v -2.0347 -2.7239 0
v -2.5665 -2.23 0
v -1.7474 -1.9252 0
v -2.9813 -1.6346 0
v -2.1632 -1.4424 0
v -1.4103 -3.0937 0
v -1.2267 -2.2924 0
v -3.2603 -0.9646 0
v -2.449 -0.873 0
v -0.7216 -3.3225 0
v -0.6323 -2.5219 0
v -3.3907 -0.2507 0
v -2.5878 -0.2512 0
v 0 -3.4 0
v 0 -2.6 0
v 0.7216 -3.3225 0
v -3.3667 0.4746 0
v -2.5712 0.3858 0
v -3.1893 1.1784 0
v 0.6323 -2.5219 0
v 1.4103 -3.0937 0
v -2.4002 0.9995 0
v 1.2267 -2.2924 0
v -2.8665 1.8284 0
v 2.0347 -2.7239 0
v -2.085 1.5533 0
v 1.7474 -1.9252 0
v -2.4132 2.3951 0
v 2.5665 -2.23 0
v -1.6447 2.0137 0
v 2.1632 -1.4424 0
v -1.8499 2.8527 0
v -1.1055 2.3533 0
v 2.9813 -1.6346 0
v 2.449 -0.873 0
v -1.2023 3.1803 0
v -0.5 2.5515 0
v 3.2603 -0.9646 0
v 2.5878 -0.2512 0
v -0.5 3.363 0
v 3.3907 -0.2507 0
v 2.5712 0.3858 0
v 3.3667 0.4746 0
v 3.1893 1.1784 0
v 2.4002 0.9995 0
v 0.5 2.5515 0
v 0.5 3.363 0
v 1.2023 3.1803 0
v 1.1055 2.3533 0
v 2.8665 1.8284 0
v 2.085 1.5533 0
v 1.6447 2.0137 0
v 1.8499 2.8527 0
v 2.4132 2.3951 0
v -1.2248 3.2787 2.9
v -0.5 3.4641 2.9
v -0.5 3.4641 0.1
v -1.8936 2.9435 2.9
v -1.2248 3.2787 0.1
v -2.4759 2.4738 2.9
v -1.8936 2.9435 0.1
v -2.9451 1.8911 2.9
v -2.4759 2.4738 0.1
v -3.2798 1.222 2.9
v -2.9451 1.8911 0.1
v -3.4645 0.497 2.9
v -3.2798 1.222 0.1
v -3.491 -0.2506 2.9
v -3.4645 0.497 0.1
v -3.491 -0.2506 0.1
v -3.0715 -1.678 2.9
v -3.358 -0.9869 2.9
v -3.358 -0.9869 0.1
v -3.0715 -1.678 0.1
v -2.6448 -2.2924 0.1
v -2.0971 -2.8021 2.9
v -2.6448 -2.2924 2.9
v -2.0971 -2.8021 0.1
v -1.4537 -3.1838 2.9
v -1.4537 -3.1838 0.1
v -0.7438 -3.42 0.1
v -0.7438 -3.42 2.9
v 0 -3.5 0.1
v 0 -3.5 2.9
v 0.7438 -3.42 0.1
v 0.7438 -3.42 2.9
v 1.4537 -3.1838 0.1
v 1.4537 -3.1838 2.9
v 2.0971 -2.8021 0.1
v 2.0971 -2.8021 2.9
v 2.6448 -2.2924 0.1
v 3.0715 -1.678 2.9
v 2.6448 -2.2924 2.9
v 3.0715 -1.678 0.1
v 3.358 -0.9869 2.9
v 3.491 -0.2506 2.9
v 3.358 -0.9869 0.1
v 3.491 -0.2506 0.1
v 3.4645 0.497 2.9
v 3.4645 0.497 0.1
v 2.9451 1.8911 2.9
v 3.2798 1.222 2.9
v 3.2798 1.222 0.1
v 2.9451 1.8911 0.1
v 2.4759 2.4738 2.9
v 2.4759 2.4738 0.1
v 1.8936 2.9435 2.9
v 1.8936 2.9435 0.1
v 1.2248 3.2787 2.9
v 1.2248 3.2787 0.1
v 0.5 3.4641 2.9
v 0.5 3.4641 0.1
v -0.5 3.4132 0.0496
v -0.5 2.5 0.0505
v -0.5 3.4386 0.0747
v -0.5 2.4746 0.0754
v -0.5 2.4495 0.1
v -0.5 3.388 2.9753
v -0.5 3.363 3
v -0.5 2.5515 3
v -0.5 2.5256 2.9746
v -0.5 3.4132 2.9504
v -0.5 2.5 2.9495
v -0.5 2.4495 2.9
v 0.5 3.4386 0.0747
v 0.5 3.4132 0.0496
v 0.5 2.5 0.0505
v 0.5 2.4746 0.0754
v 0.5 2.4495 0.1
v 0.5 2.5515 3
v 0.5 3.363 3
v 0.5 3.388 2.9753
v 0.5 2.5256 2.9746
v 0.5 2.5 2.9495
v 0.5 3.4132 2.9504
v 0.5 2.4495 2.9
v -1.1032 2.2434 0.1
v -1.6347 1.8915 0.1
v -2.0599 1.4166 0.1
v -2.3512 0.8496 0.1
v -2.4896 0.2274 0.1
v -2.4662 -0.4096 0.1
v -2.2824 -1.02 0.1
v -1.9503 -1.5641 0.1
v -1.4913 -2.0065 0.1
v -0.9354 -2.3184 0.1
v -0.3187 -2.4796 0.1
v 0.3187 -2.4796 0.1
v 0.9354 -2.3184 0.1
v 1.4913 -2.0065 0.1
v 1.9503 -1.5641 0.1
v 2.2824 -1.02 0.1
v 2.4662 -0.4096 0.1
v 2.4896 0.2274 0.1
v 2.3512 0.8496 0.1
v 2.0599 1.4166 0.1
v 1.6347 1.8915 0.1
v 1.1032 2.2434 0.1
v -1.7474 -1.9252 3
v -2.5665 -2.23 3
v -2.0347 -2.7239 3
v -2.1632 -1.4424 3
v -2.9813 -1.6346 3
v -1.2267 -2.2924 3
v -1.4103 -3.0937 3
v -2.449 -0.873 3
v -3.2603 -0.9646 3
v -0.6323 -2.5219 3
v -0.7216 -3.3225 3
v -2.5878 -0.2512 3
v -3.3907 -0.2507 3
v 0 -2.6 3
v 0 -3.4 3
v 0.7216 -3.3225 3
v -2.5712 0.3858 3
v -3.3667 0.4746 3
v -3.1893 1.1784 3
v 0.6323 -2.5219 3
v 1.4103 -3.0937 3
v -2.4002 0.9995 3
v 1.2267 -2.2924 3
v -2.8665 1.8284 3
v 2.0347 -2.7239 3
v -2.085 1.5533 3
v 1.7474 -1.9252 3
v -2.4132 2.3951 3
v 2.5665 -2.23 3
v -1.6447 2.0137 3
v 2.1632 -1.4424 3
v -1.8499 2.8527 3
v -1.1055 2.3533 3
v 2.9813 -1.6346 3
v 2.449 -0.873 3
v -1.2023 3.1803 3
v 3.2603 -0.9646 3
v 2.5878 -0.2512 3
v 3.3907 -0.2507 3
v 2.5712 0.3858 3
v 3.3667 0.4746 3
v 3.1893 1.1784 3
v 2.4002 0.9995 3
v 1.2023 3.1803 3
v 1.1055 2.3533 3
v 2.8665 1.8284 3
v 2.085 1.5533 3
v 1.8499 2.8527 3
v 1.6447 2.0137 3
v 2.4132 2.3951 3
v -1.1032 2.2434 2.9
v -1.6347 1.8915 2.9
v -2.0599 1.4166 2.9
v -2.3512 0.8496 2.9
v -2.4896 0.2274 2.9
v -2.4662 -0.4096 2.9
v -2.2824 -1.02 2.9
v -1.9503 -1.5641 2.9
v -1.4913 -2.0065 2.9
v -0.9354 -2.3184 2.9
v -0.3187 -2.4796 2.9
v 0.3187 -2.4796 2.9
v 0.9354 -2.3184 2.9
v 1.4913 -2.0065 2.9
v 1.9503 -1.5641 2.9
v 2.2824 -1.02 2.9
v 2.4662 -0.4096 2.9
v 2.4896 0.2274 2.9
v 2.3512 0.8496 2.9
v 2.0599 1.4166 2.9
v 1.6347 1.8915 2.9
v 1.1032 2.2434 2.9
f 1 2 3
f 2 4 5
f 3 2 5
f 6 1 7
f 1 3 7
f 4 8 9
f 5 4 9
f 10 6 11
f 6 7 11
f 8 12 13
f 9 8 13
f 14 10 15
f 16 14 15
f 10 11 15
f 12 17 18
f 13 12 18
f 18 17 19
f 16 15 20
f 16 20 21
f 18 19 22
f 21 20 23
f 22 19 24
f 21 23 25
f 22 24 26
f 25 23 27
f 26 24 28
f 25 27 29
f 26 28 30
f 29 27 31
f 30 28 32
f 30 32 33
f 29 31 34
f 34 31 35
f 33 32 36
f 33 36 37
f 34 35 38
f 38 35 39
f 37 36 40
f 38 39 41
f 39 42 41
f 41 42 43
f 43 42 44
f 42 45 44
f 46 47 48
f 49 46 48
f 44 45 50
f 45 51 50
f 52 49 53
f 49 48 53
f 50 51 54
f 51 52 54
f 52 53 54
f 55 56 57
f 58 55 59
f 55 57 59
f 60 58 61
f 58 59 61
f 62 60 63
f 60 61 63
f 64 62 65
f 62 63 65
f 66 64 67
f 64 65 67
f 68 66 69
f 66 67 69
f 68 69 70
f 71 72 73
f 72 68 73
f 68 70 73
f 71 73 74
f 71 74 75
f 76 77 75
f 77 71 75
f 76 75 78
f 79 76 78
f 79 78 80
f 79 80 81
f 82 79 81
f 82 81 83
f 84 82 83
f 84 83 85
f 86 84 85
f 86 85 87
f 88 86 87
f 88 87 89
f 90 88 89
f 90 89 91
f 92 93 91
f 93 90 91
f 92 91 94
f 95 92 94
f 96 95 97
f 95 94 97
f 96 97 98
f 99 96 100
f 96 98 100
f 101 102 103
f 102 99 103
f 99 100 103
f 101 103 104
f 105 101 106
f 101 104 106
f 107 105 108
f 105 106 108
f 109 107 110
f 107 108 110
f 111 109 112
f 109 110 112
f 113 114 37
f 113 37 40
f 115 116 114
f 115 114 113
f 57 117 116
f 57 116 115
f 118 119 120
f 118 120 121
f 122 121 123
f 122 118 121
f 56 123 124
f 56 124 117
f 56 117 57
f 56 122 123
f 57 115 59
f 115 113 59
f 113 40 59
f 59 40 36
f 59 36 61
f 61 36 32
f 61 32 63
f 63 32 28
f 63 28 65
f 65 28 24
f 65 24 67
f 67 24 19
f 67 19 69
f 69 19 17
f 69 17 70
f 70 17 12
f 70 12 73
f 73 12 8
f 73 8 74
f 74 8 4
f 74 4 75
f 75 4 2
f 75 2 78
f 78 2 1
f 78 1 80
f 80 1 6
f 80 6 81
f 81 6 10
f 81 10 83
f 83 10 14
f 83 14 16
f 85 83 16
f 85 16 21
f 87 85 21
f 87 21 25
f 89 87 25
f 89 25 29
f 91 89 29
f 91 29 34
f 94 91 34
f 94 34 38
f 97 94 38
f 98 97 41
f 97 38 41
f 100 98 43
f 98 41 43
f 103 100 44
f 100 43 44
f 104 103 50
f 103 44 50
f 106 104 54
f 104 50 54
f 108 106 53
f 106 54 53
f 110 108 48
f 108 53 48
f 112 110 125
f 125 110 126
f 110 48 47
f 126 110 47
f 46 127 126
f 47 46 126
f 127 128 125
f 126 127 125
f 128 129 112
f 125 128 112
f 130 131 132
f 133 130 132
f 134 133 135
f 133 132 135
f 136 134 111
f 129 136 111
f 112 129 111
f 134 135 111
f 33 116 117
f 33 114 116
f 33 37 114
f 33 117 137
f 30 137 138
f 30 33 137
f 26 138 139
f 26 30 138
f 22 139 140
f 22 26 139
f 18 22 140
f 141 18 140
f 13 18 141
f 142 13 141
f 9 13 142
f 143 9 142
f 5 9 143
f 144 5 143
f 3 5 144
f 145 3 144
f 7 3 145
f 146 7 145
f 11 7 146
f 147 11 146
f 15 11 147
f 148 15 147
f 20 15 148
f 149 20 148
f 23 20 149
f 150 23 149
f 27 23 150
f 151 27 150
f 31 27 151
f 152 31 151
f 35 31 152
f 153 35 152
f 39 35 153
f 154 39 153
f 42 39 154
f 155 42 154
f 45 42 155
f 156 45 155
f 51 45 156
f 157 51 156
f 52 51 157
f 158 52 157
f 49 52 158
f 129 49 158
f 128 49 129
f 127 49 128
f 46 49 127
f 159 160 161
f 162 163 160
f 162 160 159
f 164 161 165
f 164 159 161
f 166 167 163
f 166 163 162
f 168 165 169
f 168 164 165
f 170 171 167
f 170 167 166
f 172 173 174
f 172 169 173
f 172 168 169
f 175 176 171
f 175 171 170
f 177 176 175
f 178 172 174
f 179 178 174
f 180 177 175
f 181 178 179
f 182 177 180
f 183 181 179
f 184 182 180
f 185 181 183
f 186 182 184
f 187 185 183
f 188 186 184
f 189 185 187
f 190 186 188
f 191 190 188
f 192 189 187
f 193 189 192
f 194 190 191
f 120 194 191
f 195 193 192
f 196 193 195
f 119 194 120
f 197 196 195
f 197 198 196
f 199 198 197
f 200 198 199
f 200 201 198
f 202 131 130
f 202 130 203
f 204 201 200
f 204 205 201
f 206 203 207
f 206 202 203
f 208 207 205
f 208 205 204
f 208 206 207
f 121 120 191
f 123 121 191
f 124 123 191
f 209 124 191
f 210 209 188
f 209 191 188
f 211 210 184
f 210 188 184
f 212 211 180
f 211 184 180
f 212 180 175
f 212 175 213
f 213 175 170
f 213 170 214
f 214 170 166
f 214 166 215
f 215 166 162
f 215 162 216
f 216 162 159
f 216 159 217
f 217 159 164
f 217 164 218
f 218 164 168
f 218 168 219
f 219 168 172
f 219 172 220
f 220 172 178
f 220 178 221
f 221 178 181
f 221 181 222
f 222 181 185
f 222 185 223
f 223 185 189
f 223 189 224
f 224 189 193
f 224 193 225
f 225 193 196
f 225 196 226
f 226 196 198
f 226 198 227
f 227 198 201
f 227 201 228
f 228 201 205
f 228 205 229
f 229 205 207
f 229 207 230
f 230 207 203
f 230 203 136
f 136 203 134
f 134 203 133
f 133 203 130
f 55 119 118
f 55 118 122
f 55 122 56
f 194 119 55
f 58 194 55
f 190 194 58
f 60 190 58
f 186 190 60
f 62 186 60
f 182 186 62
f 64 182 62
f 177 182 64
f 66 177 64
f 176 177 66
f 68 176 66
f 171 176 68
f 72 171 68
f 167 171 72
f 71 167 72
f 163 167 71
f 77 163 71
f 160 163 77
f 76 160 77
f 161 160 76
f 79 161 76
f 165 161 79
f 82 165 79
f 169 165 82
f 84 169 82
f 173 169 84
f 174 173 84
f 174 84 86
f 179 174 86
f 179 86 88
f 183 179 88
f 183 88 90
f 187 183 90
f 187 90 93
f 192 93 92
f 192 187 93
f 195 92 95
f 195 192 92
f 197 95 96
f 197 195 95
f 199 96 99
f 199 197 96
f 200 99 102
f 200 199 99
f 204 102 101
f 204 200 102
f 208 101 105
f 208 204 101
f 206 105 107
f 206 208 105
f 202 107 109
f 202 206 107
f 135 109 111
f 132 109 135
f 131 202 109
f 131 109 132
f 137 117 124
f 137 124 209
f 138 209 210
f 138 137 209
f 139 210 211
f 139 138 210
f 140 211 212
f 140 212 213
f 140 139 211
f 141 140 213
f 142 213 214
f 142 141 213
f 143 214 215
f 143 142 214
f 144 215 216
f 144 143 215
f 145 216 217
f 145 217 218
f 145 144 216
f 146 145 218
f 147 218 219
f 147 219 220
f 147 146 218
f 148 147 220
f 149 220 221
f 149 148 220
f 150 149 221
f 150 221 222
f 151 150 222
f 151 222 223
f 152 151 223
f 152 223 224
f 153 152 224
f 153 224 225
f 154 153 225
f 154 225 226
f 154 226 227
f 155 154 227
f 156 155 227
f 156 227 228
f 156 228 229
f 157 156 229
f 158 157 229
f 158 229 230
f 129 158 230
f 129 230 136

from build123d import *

# Parameters (mm, degrees)
SKETCH_1_R               = 3.5
SKETCH_1_R_2             = 2.5
EXTRUDE_1_DEPTH          = 3
CHAMFER_1_SIZE           = 0.1
CUT_EXTRUDE_2_DEPTH      = 6.787918451
CUT_EXTRUDE_2_DEPTH_BACK = 6.787918451
SKETCH_2_W               = 1
SKETCH_2_H               = 3.5


with BuildPart() as part:
    # 草图1 → 拉伸-薄壁1 (new body)
    with BuildSketch(Plane.XY):
        Circle(SKETCH_1_R)
        Circle(SKETCH_1_R_2, mode=Mode.SUBTRACT)
    extrude(amount=EXTRUDE_1_DEPTH)

    # 倒角1
    chamfer_1_edges = [part.edges().sort_by_distance(p)[0] for p in [
        (-3.5, 0, 0),
        (-2.5, 0, 0),
        (-3.5, 0, 3),
        (-2.5, 0, 3),
    ]]
    chamfer(chamfer_1_edges, length=CHAMFER_1_SIZE)

    # 草图2 → 切除-拉伸-薄壁2 (cut, two sides: drawn at the far end of the back side and taken through both)
    with BuildSketch(Plane(origin=(0, 0, 0), x_dir=(-1, 0, 0), z_dir=(0, 0, -1)).offset(-CUT_EXTRUDE_2_DEPTH_BACK)):
        with Locations((0, 1.75)):
            Rectangle(SKETCH_2_W, SKETCH_2_H)
    extrude(amount=CUT_EXTRUDE_2_DEPTH + CUT_EXTRUDE_2_DEPTH_BACK, mode=Mode.SUBTRACT)


solid = part.part
